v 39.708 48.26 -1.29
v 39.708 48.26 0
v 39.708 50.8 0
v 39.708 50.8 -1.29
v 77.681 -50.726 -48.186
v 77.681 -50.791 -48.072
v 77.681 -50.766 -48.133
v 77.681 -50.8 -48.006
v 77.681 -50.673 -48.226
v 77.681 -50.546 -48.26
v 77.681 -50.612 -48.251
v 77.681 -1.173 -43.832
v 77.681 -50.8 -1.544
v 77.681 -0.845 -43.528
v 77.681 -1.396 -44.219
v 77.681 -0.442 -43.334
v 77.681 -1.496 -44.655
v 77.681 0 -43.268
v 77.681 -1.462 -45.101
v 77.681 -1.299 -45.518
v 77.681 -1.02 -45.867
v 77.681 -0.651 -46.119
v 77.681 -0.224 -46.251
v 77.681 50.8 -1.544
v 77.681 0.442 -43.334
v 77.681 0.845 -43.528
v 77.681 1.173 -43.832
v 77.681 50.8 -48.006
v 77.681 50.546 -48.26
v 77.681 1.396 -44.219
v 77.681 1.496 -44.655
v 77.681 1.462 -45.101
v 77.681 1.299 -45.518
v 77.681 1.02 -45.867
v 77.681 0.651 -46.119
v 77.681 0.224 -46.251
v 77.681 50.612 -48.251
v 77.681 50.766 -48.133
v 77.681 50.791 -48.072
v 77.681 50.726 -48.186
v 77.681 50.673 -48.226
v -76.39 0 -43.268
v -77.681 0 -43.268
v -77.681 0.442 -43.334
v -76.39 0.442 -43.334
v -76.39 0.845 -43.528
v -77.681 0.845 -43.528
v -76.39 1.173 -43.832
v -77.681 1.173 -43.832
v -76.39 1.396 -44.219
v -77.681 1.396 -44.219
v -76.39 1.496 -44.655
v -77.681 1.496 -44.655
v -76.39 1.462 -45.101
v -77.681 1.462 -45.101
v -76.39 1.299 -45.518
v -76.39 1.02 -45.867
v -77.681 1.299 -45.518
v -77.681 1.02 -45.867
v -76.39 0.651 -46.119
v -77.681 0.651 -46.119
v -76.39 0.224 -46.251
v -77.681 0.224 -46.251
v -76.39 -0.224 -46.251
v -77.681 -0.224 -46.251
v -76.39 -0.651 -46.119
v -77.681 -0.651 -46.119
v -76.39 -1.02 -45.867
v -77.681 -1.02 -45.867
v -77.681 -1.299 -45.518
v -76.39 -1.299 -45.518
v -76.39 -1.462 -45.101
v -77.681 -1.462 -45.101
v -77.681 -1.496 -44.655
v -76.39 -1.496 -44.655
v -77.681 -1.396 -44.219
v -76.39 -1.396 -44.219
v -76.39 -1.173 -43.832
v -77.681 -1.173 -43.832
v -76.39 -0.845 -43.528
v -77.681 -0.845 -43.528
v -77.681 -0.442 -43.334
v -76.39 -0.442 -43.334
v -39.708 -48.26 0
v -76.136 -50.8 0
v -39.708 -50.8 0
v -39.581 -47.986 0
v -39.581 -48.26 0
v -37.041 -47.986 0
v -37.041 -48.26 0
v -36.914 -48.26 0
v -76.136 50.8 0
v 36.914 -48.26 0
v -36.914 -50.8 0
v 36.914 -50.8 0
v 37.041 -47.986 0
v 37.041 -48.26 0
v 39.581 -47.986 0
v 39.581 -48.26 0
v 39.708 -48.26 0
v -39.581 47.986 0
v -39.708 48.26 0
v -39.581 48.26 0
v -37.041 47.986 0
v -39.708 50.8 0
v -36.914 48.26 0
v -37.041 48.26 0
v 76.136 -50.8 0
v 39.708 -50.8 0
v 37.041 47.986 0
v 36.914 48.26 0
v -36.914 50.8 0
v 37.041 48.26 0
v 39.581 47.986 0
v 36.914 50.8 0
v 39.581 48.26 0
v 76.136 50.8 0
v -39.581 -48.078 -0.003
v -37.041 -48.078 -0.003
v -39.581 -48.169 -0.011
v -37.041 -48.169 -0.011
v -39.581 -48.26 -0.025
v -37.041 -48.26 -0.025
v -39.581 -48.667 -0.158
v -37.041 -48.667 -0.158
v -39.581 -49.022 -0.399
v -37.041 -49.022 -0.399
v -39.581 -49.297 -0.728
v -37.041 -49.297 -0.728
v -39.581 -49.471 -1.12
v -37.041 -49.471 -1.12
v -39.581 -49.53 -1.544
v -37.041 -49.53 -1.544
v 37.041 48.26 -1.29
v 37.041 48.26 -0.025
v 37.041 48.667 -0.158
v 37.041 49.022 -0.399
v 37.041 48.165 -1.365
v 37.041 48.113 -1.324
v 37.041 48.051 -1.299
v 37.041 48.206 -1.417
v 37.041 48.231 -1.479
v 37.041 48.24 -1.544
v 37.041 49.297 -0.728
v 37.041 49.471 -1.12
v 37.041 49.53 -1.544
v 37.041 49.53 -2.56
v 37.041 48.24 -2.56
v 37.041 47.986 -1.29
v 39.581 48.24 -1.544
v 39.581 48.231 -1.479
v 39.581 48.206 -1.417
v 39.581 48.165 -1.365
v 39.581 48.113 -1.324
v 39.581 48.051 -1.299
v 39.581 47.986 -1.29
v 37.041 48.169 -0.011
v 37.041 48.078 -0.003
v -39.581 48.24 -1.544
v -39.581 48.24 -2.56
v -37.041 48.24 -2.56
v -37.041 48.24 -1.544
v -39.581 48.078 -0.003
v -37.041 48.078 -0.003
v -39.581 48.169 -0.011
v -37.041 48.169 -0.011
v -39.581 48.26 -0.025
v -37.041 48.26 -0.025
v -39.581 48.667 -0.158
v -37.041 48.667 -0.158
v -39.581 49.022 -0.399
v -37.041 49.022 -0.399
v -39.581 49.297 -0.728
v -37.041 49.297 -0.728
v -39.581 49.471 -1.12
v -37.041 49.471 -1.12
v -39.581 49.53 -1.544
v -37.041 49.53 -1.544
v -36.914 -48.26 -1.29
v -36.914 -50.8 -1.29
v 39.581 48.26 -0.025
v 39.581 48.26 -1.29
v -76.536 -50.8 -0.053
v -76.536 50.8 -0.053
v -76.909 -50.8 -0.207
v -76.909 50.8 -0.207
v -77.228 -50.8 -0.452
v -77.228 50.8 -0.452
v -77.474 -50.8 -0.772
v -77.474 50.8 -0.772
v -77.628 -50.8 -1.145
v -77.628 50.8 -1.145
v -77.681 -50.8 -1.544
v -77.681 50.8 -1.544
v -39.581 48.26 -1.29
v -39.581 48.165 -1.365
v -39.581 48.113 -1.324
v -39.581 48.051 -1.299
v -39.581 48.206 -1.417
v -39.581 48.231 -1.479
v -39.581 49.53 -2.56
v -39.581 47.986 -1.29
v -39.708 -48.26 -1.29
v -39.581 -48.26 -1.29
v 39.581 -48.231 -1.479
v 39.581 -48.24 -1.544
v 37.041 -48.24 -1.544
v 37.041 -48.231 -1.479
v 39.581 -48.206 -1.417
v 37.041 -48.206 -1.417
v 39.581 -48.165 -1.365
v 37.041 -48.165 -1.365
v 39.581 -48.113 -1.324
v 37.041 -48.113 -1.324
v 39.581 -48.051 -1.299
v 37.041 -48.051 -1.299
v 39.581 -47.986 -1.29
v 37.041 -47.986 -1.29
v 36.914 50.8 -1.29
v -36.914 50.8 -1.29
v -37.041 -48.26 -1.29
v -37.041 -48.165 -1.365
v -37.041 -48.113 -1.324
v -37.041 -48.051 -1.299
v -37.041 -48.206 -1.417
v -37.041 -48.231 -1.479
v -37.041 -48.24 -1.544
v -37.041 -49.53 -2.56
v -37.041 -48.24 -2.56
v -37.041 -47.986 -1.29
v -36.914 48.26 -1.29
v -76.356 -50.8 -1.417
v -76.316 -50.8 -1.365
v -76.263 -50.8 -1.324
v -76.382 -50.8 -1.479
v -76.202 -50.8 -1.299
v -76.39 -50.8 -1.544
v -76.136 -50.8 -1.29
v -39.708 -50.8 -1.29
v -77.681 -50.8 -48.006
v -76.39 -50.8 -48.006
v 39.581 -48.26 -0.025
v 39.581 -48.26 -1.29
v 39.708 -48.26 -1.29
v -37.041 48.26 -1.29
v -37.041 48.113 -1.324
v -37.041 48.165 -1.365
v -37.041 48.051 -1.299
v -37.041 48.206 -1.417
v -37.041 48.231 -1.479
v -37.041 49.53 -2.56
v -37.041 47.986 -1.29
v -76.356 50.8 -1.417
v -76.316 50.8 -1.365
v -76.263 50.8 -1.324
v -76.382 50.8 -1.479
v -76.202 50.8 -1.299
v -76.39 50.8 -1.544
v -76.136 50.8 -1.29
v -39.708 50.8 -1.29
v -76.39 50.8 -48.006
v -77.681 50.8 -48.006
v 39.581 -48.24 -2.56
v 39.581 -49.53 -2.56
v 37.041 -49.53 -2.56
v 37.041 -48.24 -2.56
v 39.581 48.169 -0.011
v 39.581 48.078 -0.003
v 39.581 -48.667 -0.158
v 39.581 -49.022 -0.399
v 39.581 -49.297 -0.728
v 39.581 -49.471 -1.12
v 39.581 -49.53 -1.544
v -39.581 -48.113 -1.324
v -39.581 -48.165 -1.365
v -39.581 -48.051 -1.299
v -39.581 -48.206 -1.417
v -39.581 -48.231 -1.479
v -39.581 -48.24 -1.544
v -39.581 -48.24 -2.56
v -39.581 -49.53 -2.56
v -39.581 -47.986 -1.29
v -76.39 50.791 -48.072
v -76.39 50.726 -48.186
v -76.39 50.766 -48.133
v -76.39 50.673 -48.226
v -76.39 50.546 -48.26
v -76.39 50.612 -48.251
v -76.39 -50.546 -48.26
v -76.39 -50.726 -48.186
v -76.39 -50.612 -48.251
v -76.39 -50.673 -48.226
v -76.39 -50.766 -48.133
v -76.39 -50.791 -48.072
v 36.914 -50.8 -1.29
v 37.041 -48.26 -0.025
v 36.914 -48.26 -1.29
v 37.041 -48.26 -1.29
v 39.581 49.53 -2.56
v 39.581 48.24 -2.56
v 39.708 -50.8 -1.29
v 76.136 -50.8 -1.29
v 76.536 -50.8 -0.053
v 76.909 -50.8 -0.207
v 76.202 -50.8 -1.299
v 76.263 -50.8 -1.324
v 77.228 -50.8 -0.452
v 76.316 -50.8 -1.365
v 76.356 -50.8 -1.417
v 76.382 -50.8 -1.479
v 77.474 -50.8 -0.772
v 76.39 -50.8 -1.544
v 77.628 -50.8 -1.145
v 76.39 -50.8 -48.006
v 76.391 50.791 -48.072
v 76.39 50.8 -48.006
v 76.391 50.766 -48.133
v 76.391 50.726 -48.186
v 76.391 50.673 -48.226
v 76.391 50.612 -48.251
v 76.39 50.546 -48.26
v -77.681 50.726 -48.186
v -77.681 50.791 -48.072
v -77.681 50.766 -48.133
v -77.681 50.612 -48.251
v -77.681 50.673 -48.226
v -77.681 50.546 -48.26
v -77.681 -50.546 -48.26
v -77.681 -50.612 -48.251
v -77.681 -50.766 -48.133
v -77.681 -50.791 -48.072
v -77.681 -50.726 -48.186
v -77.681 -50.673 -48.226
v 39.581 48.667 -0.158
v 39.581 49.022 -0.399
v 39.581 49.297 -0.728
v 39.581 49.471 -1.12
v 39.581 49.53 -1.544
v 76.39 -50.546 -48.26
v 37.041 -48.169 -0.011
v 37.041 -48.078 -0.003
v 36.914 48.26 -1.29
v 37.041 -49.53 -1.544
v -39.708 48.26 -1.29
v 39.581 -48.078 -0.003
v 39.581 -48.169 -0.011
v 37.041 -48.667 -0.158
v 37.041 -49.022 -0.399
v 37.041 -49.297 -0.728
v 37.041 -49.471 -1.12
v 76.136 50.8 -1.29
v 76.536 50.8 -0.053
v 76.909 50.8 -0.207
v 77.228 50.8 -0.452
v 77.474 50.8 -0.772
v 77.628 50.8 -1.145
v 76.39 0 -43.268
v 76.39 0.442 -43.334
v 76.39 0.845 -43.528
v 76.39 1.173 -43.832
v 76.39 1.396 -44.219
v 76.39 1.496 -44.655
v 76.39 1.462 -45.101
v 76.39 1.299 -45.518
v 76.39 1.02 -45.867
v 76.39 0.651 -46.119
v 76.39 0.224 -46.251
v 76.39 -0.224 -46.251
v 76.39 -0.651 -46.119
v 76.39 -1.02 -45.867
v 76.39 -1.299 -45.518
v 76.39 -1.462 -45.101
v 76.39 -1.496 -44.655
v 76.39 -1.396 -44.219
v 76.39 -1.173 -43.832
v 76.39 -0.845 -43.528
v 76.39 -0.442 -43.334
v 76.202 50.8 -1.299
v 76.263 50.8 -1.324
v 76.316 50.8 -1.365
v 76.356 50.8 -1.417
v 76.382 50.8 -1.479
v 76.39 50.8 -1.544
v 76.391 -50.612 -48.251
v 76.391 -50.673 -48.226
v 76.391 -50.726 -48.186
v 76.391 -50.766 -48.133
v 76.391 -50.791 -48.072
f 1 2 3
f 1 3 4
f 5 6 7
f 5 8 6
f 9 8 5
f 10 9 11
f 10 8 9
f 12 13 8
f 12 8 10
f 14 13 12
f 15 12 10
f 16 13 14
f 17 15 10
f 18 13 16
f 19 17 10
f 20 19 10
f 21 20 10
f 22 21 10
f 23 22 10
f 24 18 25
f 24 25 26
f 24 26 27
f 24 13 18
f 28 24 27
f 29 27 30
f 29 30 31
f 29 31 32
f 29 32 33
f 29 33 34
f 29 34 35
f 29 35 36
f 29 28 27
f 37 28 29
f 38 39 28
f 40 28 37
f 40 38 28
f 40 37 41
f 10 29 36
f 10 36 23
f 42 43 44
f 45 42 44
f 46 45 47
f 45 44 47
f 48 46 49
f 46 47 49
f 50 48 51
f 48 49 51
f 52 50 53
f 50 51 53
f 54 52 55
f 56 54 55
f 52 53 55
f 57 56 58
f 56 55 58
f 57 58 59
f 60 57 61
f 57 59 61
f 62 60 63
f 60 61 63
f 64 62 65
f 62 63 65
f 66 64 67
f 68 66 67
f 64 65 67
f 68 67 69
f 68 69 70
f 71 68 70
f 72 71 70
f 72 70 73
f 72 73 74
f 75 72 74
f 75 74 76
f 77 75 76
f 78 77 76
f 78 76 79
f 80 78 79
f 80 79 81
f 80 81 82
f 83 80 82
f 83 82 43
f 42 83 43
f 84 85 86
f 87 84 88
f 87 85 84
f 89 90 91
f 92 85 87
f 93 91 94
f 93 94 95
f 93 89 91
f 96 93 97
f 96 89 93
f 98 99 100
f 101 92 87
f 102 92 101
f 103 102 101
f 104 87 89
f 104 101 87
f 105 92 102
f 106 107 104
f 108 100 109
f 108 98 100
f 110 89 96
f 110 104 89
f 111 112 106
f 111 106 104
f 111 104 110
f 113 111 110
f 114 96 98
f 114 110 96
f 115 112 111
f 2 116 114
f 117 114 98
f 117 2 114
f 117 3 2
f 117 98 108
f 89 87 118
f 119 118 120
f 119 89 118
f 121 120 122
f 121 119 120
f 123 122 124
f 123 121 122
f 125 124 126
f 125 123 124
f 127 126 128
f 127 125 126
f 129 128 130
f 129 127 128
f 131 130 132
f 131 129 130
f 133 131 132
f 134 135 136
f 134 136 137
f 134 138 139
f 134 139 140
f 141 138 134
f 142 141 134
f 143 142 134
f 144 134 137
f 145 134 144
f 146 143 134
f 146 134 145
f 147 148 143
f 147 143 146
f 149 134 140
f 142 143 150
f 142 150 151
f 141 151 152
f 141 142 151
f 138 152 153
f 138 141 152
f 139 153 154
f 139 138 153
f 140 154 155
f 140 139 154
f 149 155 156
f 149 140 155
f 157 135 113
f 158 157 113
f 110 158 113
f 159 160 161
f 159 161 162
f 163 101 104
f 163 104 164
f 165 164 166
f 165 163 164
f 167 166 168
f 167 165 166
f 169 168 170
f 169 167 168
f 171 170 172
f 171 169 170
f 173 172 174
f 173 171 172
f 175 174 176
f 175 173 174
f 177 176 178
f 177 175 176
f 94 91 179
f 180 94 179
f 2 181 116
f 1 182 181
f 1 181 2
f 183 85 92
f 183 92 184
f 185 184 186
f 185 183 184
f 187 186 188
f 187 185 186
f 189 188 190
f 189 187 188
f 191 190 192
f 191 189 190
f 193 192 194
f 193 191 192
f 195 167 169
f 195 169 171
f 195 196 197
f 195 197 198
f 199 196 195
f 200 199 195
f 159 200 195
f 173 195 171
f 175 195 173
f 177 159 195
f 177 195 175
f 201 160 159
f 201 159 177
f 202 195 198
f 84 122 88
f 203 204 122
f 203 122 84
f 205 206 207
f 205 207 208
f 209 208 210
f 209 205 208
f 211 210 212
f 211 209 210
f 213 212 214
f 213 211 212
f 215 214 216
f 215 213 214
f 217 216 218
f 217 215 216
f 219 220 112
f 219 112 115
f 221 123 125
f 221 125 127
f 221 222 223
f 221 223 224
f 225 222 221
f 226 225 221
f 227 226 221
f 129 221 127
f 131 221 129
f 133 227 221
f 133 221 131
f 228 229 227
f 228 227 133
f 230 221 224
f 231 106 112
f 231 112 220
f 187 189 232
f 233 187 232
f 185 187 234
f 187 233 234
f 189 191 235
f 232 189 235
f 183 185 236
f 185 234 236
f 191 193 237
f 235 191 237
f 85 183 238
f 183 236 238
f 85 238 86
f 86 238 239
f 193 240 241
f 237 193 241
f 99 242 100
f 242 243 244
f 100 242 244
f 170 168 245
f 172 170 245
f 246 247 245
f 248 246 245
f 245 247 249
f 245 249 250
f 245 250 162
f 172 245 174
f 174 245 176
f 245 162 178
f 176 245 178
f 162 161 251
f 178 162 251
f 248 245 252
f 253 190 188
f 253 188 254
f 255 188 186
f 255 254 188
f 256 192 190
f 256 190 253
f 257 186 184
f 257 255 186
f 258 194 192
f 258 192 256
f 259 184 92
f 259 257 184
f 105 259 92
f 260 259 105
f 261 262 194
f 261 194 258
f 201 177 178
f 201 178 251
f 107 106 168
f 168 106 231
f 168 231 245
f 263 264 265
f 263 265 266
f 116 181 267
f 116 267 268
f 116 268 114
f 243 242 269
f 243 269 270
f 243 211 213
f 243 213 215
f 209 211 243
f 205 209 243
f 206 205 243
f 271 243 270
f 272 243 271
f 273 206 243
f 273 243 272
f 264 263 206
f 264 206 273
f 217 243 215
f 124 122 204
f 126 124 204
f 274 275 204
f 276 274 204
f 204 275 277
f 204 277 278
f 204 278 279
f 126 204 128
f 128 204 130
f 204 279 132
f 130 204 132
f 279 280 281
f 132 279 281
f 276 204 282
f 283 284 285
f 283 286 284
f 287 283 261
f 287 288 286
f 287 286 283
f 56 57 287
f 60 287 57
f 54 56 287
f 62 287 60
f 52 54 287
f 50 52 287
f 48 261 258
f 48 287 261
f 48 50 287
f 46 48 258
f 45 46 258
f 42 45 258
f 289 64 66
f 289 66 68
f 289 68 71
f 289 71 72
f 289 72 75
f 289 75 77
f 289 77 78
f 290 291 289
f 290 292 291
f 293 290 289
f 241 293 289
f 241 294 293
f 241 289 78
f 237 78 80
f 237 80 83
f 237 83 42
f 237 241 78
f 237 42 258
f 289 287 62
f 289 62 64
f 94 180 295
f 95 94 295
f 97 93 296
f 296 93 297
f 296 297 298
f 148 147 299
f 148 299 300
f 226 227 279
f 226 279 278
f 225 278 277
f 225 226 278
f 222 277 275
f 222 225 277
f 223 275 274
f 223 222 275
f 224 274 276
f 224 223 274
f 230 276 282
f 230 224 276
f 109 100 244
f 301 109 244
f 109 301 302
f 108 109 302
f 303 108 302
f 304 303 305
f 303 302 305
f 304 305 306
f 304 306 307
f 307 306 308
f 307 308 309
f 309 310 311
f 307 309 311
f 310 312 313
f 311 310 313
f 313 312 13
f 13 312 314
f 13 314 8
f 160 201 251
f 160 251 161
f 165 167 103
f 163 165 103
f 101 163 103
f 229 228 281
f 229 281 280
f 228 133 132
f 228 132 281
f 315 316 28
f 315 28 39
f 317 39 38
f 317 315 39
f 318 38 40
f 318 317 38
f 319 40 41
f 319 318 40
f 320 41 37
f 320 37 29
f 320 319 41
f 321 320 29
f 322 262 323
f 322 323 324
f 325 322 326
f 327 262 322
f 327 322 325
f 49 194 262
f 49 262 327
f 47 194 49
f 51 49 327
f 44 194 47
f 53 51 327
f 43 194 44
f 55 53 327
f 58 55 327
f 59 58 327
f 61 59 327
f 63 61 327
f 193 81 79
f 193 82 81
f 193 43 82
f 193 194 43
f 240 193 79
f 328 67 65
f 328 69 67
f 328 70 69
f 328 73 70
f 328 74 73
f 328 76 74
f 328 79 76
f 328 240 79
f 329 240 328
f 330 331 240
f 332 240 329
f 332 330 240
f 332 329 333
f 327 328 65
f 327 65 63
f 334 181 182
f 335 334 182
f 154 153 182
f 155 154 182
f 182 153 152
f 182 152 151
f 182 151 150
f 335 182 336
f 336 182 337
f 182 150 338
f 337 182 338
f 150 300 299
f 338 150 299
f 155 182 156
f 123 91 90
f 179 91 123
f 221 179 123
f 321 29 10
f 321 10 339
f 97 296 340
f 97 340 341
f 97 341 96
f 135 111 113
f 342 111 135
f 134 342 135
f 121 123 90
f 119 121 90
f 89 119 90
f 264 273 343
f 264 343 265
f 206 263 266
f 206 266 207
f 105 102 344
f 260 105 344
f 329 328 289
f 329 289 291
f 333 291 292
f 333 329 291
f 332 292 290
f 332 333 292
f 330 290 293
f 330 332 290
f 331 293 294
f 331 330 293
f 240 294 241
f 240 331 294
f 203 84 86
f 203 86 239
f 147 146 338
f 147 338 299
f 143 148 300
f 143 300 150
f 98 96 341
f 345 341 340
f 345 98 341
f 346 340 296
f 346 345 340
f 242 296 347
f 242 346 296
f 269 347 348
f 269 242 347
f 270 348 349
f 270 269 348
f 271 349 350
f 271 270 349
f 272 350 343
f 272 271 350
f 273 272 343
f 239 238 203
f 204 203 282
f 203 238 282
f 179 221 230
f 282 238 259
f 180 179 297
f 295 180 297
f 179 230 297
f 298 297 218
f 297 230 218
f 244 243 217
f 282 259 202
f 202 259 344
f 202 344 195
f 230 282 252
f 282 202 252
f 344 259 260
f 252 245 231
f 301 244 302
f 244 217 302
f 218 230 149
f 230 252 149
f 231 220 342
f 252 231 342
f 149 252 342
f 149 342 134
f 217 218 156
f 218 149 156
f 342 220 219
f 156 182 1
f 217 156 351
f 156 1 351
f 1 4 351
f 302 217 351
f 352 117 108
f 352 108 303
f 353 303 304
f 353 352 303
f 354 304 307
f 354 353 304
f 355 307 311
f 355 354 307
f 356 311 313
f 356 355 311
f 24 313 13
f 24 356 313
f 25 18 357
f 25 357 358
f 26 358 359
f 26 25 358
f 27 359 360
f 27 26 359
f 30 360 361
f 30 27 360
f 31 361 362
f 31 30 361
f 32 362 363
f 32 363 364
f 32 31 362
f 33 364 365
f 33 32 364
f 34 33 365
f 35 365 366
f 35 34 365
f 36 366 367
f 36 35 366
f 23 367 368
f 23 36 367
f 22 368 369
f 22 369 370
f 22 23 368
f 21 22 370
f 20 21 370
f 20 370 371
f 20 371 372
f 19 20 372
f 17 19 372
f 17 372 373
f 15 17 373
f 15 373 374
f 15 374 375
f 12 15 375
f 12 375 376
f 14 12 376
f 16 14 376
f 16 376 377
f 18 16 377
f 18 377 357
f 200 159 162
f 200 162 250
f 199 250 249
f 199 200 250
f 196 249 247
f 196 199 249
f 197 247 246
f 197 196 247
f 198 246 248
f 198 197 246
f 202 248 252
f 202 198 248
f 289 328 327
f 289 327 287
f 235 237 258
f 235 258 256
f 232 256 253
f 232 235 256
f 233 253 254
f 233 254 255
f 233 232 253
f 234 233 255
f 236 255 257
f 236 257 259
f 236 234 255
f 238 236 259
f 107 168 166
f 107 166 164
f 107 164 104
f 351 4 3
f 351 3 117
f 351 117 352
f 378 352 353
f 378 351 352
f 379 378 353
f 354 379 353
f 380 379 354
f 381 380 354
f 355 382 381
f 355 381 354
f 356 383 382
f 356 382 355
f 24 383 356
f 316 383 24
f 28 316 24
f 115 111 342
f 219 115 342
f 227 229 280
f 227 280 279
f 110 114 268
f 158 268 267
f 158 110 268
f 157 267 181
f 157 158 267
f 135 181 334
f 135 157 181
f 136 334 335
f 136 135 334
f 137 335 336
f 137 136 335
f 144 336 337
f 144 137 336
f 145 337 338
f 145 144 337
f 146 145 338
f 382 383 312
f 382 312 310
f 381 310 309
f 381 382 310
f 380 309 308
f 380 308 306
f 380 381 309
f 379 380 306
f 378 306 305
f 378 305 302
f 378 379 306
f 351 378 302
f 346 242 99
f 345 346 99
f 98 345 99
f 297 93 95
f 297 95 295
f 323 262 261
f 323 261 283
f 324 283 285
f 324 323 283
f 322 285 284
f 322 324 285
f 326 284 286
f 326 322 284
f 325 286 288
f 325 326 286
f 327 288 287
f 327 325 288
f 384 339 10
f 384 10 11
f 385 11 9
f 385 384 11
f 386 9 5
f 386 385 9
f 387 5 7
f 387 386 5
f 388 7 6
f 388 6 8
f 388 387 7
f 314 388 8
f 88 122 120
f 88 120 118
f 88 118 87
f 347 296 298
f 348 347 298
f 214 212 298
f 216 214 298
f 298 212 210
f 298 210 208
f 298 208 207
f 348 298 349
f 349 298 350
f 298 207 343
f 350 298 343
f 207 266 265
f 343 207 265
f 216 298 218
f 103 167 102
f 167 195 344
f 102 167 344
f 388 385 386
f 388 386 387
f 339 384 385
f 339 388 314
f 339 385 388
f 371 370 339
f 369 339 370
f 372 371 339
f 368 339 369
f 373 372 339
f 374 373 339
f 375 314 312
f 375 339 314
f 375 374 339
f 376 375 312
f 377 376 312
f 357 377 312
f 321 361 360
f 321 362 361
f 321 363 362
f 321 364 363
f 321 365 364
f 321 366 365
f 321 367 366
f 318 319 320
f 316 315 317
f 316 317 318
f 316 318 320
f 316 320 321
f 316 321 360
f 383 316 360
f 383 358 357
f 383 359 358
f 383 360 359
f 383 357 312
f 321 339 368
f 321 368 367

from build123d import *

# Parameters (mm, degrees)
SKETCH1_W                      = 152.4
SKETCH1_H                      = 101.6
BASE_FLANGE1_DEPTH             = 1.29032
EDGE_FLANGE1_STRIP_W           = 5.85978
EDGE_FLANGE1_STRIP_H           = 1.29032
EDGE_FLANGE1_STRIP_CUT_DEPTH   = 101.6
EDGE_FLANGE1_STRIP_2_W         = 5.85978
EDGE_FLANGE1_STRIP_2_H         = 1.29032
EDGE_FLANGE1_STRIP_CUT_2_DEPTH = 101.6
EDGE_FLANGE1_DEPTH             = 101.6
EDGE_FLANGE1_BEND_DEPTH        = 101.6
M3X0_5_TAPPED_HOLE1_REACH      = 172.432
M3X0_5_TAPPED_HOLE1_BORE_R     = 1.5
BREAK_CORNER1_START            = -77.68082
BREAK_CORNER1_DEPTH            = 155.36164
CUT_THICKEN1_START             = 48.26
CUT_THICKEN1_OUTLINE_W         = 0.127
CUT_THICKEN1_OUTLINE_H         = 1.29032
CUT_THICKEN1_DEPTH             = 2.54
CUT_THICKEN2_START             = 48.26
CUT_THICKEN2_OUTLINE_W         = 0.127
CUT_THICKEN2_OUTLINE_H         = 1.29032
CUT_THICKEN2_DEPTH             = 2.54
MIRROR7_START                  = 48.26
MIRROR7_COPY_1_SKETCH_W        = 0.127
MIRROR7_COPY_1_SKETCH_H        = 1.29032
MIRROR7_COPY_1_DEPTH           = 2.54
MIRROR7_COPY_2_SKETCH_W        = 0.127
MIRROR7_COPY_2_SKETCH_H        = 1.29032
MIRROR7_COPY_2_DEPTH           = 2.54
MOVE_FACE1_BY                  = 1.27
MOVE_FACE1_2_BY                = 1.27
MOVE_FACE1_3_BY                = 1.27
MOVE_FACE1_4_BY                = 1.27
EDGE_FLANGE2_STRIP_W           = 5.66928
EDGE_FLANGE2_STRIP_H           = 1.29032
EDGE_FLANGE2_STRIP_CUT_DEPTH   = 2.54
EDGE_FLANGE2_STRIP_2_W         = 5.66928
EDGE_FLANGE2_STRIP_2_H         = 1.29032
EDGE_FLANGE2_STRIP_CUT_2_DEPTH = 2.54
EDGE_FLANGE2_STRIP_3_W         = 5.66928
EDGE_FLANGE2_STRIP_3_H         = 1.29032
EDGE_FLANGE2_STRIP_CUT_3_DEPTH = 2.54
EDGE_FLANGE2_STRIP_4_W         = 5.66928
EDGE_FLANGE2_STRIP_4_H         = 1.29032
EDGE_FLANGE2_STRIP_CUT_4_DEPTH = 2.54
EDGE_FLANGE2_DEPTH             = 2.54
EDGE_FLANGE2_BEND_DEPTH        = 2.54
EDGE_FLANGE2_BEND_2_DEPTH      = 2.54
EDGE_FLANGE2_BEND_3_DEPTH      = 2.54


# Read off the part's stored shape, not the designer's step: Break-Corner1, Cut-Thicken1, Cut-Thicken2
# Sheet-metal steps are written as plain solids
with BuildPart() as part:
    # Sketch1 → Base-Flange1 (new body)
    with BuildSketch(Plane.XY):
        Rectangle(SKETCH1_W, SKETCH1_H)
    extrude(amount=-BASE_FLANGE1_DEPTH)

    # Edge-Flange1 strip (across the edge) → Edge-Flange1 strip cut (cut)
    with BuildSketch(Plane(origin=(-76.3905, -50.8, -1.29032), x_dir=(1, 0, 0), z_dir=(0, 1, 0))):
        with Locations((-2.67589, -0.64516)):
            Rectangle(EDGE_FLANGE1_STRIP_W, EDGE_FLANGE1_STRIP_H)
    extrude(amount=EDGE_FLANGE1_STRIP_CUT_DEPTH, mode=Mode.SUBTRACT)

    # Edge-Flange1 strip 2 (across the edge) → Edge-Flange1 strip cut 2 (cut)
    with BuildSketch(Plane(origin=(76.3905, 50.8, -1.29032), x_dir=(-1, 0, 0), z_dir=(0, -1, 0))):
        with Locations((-2.67589, -0.64516)):
            Rectangle(EDGE_FLANGE1_STRIP_2_W, EDGE_FLANGE1_STRIP_2_H)
    extrude(amount=EDGE_FLANGE1_STRIP_CUT_2_DEPTH, mode=Mode.SUBTRACT)

    # Edge-Flange1 section (across the edge) → Edge-Flange1 (add)
    with BuildSketch(Plane(origin=(-76.3905, -50.8, -1.29032), x_dir=(1, 0, 0), z_dir=(0, 1, 0))):
        with BuildLine():
            Line((-1.29032, 0.254), (-1.29032, 46.96968))
            Line((-1.29032, 46.96968), (0, 46.96968))
            Line((0, 46.96968), (0, 0.254))
            ThreePointArc((0, 0.254), (0.074394878, 0.074394878), (0.254, 0))
            Line((0.254, 0), (0.254, -1.29032))
            ThreePointArc((0.254, -1.29032), (-0.837999144, -0.837999144), (-1.29032, 0.254))
        make_face()
    extrude(amount=EDGE_FLANGE1_DEPTH)

    # Edge-Flange1 section 2 (across the edge) → Edge-Flange1 bend (add)
    with BuildSketch(Plane(origin=(76.3905, 50.8, -1.29032), x_dir=(-1, 0, 0), z_dir=(0, -1, 0))):
        with BuildLine():
            Line((-1.29032, 0.254), (-1.29032, 46.96968))
            Line((-1.29032, 46.96968), (0, 46.96968))
            Line((0, 46.96968), (0, 0.254))
            ThreePointArc((0, 0.254), (0.074394878, 0.074394878), (0.254, 0))
            Line((0.254, 0), (0.254, -1.29032))
            ThreePointArc((0.254, -1.29032), (-0.837999144, -0.837999144), (-1.29032, 0.254))
        make_face()
    extrude(amount=EDGE_FLANGE1_BEND_DEPTH)

    # M3x0.5 Tapped Hole1 bore → M3x0.5 Tapped Hole1 (cut, up to next)
    with BuildSketch(Plane.ZY.offset(77.68082), mode=Mode.PRIVATE) as m3x0_5_tapped_hole1_sk1:
        with Locations((-44.7675, 0)):
            Circle(M3X0_5_TAPPED_HOLE1_BORE_R)
    m3x0_5_tapped_hole1_tool1 = extrude(m3x0_5_tapped_hole1_sk1.sketch, amount=-M3X0_5_TAPPED_HOLE1_REACH, mode=Mode.PRIVATE) & part.part
    m3x0_5_tapped_hole1 = m3x0_5_tapped_hole1_tool1.solids().sort_by_distance((-77.68082, 0, -44.7675))[0]
    add(m3x0_5_tapped_hole1, mode=Mode.SUBTRACT)

    # Mirror1: M3x0.5 Tapped Hole1 across plane
    add(m3x0_5_tapped_hole1.mirror(Plane(origin=(0, 0, 0), x_dir=(0, 0, 1), z_dir=(1, 0, 0))), mode=Mode.SUBTRACT)

    # Break-Corner1 outline → Break-Corner1 (cut)
    with BuildSketch(Plane.YZ.offset(BREAK_CORNER1_START)):
        with BuildLine():
            Line((50.8, -48.26), (50.8, -48.006))
            ThreePointArc((50.8, -48.006), (50.725605122, -48.185605122), (50.546, -48.26))
            Line((50.546, -48.26), (50.8, -48.26))
        make_face()
        with BuildLine():
            Line((-50.8, -48.26), (-50.546, -48.26))
            ThreePointArc((-50.546, -48.26), (-50.725605122, -48.185605122), (-50.8, -48.006))
            Line((-50.8, -48.006), (-50.8, -48.26))
        make_face()
    extrude(amount=BREAK_CORNER1_DEPTH, mode=Mode.SUBTRACT)

    # Cut-Thicken1 outline → Cut-Thicken1 (cut)
    with BuildSketch(Plane(origin=(0, 0, 0), x_dir=(1, 0, 0), z_dir=(0, 1, 0)).offset(CUT_THICKEN1_START)):
        with Locations((36.97732, 0.64516)):
            Rectangle(CUT_THICKEN1_OUTLINE_W, CUT_THICKEN1_OUTLINE_H)
    cut_thicken1 = extrude(amount=CUT_THICKEN1_DEPTH, mode=Mode.SUBTRACT)

    # Cut-Thicken2 outline → Cut-Thicken2 (cut)
    with BuildSketch(Plane(origin=(0, 0, 0), x_dir=(1, 0, 0), z_dir=(0, 1, 0)).offset(CUT_THICKEN2_START)):
        with Locations((39.64432, 0.64516)):
            Rectangle(CUT_THICKEN2_OUTLINE_W, CUT_THICKEN2_OUTLINE_H)
    cut_thicken2 = extrude(amount=CUT_THICKEN2_DEPTH, mode=Mode.SUBTRACT)

    # Mirror6: Cut-Thicken1, Cut-Thicken2 across plane
    add(cut_thicken1.mirror(Plane(origin=(0, 0, 0), x_dir=(0, 0, 1), z_dir=(1, 0, 0))), mode=Mode.SUBTRACT)
    add(cut_thicken2.mirror(Plane(origin=(0, 0, 0), x_dir=(0, 0, 1), z_dir=(1, 0, 0))), mode=Mode.SUBTRACT)

    # Mirror7: Cut-Thicken1, Cut-Thicken2 across plane
    add(cut_thicken1.mirror(Plane.ZX), mode=Mode.SUBTRACT)
    add(cut_thicken2.mirror(Plane.ZX), mode=Mode.SUBTRACT)

    # Mirror7 copy 1 sketch → Mirror7 copy 1 (cut)
    with BuildSketch(Plane(origin=(0, 0, 0), x_dir=(-1, 0, 0), z_dir=(0, -1, 0)).offset(MIRROR7_START)):
        with Locations((36.97732, 0.64516)):
            Rectangle(MIRROR7_COPY_1_SKETCH_W, MIRROR7_COPY_1_SKETCH_H)
    extrude(amount=MIRROR7_COPY_1_DEPTH, mode=Mode.SUBTRACT)

    # Mirror7 copy 2 sketch → Mirror7 copy 2 (cut)
    with BuildSketch(Plane(origin=(0, 0, 0), x_dir=(-1, 0, 0), z_dir=(0, -1, 0)).offset(MIRROR7_START)):
        with Locations((39.64432, 0.64516)):
            Rectangle(MIRROR7_COPY_2_SKETCH_W, MIRROR7_COPY_2_SKETCH_H)
    extrude(amount=MIRROR7_COPY_2_DEPTH, mode=Mode.SUBTRACT)

    # Move Face1: a face moved inward by 1.27
    extrude(part.faces().sort_by_distance((-38.31082, -50.8, -0.64516))[0], amount=MOVE_FACE1_BY, dir=(0, 1, 0), mode=Mode.SUBTRACT)

    # Move Face1 2: a face moved inward by 1.27
    extrude(part.faces().sort_by_distance((38.31082, -50.8, -0.64516))[0], amount=MOVE_FACE1_2_BY, dir=(0, 1, 0), mode=Mode.SUBTRACT)

    # Move Face1 3: a face moved inward by 1.27
    extrude(part.faces().sort_by_distance((-38.31082, 50.8, -0.64516))[0], amount=MOVE_FACE1_3_BY, dir=(0, -1, 0), mode=Mode.SUBTRACT)

    # Move Face1 4: a face moved inward by 1.27
    extrude(part.faces().sort_by_distance((38.31082, 50.8, -0.64516))[0], amount=MOVE_FACE1_4_BY, dir=(0, -1, 0), mode=Mode.SUBTRACT)

    # Edge-Flange2 strip (across the edge) → Edge-Flange2 strip cut (cut)
    with BuildSketch(Plane(origin=(37.04082, 49.53, -1.29032), x_dir=(0, -1, 0), z_dir=(1, 0, 0))):
        with Locations((-1.29032, -0.64516)):
            Rectangle(EDGE_FLANGE2_STRIP_W, EDGE_FLANGE2_STRIP_H)
    extrude(amount=EDGE_FLANGE2_STRIP_CUT_DEPTH, mode=Mode.SUBTRACT)

    # Edge-Flange2 strip 2 (across the edge) → Edge-Flange2 strip cut 2 (cut)
    with BuildSketch(Plane(origin=(-39.58082, 49.53, -1.29032), x_dir=(0, -1, 0), z_dir=(1, 0, 0))):
        with Locations((-1.29032, -0.64516)):
            Rectangle(EDGE_FLANGE2_STRIP_2_W, EDGE_FLANGE2_STRIP_2_H)
    extrude(amount=EDGE_FLANGE2_STRIP_CUT_2_DEPTH, mode=Mode.SUBTRACT)

    # Edge-Flange2 strip 3 (across the edge) → Edge-Flange2 strip cut 3 (cut)
    with BuildSketch(Plane(origin=(39.58082, -49.53, -1.29032), x_dir=(0, 1, 0), z_dir=(-1, 0, 0))):
        with Locations((-1.29032, -0.64516)):
            Rectangle(EDGE_FLANGE2_STRIP_3_W, EDGE_FLANGE2_STRIP_3_H)
    extrude(amount=EDGE_FLANGE2_STRIP_CUT_3_DEPTH, mode=Mode.SUBTRACT)

    # Edge-Flange2 strip 4 (across the edge) → Edge-Flange2 strip cut 4 (cut)
    with BuildSketch(Plane(origin=(-37.04082, -49.53, -1.29032), x_dir=(0, 1, 0), z_dir=(-1, 0, 0))):
        with Locations((-1.29032, -0.64516)):
            Rectangle(EDGE_FLANGE2_STRIP_4_W, EDGE_FLANGE2_STRIP_4_H)
    extrude(amount=EDGE_FLANGE2_STRIP_CUT_4_DEPTH, mode=Mode.SUBTRACT)

    # Edge-Flange2 section (across the edge) → Edge-Flange2 (add)
    with BuildSketch(Plane(origin=(37.04082, 49.53, -1.29032), x_dir=(0, -1, 0), z_dir=(1, 0, 0))):
        with BuildLine():
            Line((0, 0.254), (0, 1.27))
            Line((0, 1.27), (1.29032, 1.27))
            Line((1.29032, 1.27), (1.29032, 0.254))
            ThreePointArc((1.29032, 0.254), (1.364714878, 0.074394878), (1.54432, 0))
            Line((1.54432, 0), (1.54432, -1.29032))
            ThreePointArc((1.54432, -1.29032), (0.452320856, -0.837999144), (0, 0.254))
        make_face()
    extrude(amount=EDGE_FLANGE2_DEPTH)

    # Edge-Flange2 section 2 (across the edge) → Edge-Flange2 bend (add)
    with BuildSketch(Plane(origin=(-39.58082, 49.53, -1.29032), x_dir=(0, -1, 0), z_dir=(1, 0, 0))):
        with BuildLine():
            Line((0, 0.254), (0, 1.27))
            Line((0, 1.27), (1.29032, 1.27))
            Line((1.29032, 1.27), (1.29032, 0.254))
            ThreePointArc((1.29032, 0.254), (1.364714878, 0.074394878), (1.54432, 0))
            Line((1.54432, 0), (1.54432, -1.29032))
            ThreePointArc((1.54432, -1.29032), (0.452320856, -0.837999144), (0, 0.254))
        make_face()
    extrude(amount=EDGE_FLANGE2_BEND_DEPTH)

    # Edge-Flange2 section 3 (across the edge) → Edge-Flange2 bend 2 (add)
    with BuildSketch(Plane(origin=(39.58082, -49.53, -1.29032), x_dir=(0, 1, 0), z_dir=(-1, 0, 0))):
        with BuildLine():
            Line((0, 0.254), (0, 1.27))
            Line((0, 1.27), (1.29032, 1.27))
            Line((1.29032, 1.27), (1.29032, 0.254))
            ThreePointArc((1.29032, 0.254), (1.364714878, 0.074394878), (1.54432, 0))
            Line((1.54432, 0), (1.54432, -1.29032))
            ThreePointArc((1.54432, -1.29032), (0.452320856, -0.837999144), (0, 0.254))
        make_face()
    extrude(amount=EDGE_FLANGE2_BEND_2_DEPTH)

    # Edge-Flange2 section 4 (across the edge) → Edge-Flange2 bend 3 (add)
    with BuildSketch(Plane(origin=(-37.04082, -49.53, -1.29032), x_dir=(0, 1, 0), z_dir=(-1, 0, 0))):
        with BuildLine():
            Line((0, 0.254), (0, 1.27))
            Line((0, 1.27), (1.29032, 1.27))
            Line((1.29032, 1.27), (1.29032, 0.254))
            ThreePointArc((1.29032, 0.254), (1.364714878, 0.074394878), (1.54432, 0))
            Line((1.54432, 0), (1.54432, -1.29032))
            ThreePointArc((1.54432, -1.29032), (0.452320856, -0.837999144), (0, 0.254))
        make_face()
    extrude(amount=EDGE_FLANGE2_BEND_3_DEPTH)


solid = part.part
